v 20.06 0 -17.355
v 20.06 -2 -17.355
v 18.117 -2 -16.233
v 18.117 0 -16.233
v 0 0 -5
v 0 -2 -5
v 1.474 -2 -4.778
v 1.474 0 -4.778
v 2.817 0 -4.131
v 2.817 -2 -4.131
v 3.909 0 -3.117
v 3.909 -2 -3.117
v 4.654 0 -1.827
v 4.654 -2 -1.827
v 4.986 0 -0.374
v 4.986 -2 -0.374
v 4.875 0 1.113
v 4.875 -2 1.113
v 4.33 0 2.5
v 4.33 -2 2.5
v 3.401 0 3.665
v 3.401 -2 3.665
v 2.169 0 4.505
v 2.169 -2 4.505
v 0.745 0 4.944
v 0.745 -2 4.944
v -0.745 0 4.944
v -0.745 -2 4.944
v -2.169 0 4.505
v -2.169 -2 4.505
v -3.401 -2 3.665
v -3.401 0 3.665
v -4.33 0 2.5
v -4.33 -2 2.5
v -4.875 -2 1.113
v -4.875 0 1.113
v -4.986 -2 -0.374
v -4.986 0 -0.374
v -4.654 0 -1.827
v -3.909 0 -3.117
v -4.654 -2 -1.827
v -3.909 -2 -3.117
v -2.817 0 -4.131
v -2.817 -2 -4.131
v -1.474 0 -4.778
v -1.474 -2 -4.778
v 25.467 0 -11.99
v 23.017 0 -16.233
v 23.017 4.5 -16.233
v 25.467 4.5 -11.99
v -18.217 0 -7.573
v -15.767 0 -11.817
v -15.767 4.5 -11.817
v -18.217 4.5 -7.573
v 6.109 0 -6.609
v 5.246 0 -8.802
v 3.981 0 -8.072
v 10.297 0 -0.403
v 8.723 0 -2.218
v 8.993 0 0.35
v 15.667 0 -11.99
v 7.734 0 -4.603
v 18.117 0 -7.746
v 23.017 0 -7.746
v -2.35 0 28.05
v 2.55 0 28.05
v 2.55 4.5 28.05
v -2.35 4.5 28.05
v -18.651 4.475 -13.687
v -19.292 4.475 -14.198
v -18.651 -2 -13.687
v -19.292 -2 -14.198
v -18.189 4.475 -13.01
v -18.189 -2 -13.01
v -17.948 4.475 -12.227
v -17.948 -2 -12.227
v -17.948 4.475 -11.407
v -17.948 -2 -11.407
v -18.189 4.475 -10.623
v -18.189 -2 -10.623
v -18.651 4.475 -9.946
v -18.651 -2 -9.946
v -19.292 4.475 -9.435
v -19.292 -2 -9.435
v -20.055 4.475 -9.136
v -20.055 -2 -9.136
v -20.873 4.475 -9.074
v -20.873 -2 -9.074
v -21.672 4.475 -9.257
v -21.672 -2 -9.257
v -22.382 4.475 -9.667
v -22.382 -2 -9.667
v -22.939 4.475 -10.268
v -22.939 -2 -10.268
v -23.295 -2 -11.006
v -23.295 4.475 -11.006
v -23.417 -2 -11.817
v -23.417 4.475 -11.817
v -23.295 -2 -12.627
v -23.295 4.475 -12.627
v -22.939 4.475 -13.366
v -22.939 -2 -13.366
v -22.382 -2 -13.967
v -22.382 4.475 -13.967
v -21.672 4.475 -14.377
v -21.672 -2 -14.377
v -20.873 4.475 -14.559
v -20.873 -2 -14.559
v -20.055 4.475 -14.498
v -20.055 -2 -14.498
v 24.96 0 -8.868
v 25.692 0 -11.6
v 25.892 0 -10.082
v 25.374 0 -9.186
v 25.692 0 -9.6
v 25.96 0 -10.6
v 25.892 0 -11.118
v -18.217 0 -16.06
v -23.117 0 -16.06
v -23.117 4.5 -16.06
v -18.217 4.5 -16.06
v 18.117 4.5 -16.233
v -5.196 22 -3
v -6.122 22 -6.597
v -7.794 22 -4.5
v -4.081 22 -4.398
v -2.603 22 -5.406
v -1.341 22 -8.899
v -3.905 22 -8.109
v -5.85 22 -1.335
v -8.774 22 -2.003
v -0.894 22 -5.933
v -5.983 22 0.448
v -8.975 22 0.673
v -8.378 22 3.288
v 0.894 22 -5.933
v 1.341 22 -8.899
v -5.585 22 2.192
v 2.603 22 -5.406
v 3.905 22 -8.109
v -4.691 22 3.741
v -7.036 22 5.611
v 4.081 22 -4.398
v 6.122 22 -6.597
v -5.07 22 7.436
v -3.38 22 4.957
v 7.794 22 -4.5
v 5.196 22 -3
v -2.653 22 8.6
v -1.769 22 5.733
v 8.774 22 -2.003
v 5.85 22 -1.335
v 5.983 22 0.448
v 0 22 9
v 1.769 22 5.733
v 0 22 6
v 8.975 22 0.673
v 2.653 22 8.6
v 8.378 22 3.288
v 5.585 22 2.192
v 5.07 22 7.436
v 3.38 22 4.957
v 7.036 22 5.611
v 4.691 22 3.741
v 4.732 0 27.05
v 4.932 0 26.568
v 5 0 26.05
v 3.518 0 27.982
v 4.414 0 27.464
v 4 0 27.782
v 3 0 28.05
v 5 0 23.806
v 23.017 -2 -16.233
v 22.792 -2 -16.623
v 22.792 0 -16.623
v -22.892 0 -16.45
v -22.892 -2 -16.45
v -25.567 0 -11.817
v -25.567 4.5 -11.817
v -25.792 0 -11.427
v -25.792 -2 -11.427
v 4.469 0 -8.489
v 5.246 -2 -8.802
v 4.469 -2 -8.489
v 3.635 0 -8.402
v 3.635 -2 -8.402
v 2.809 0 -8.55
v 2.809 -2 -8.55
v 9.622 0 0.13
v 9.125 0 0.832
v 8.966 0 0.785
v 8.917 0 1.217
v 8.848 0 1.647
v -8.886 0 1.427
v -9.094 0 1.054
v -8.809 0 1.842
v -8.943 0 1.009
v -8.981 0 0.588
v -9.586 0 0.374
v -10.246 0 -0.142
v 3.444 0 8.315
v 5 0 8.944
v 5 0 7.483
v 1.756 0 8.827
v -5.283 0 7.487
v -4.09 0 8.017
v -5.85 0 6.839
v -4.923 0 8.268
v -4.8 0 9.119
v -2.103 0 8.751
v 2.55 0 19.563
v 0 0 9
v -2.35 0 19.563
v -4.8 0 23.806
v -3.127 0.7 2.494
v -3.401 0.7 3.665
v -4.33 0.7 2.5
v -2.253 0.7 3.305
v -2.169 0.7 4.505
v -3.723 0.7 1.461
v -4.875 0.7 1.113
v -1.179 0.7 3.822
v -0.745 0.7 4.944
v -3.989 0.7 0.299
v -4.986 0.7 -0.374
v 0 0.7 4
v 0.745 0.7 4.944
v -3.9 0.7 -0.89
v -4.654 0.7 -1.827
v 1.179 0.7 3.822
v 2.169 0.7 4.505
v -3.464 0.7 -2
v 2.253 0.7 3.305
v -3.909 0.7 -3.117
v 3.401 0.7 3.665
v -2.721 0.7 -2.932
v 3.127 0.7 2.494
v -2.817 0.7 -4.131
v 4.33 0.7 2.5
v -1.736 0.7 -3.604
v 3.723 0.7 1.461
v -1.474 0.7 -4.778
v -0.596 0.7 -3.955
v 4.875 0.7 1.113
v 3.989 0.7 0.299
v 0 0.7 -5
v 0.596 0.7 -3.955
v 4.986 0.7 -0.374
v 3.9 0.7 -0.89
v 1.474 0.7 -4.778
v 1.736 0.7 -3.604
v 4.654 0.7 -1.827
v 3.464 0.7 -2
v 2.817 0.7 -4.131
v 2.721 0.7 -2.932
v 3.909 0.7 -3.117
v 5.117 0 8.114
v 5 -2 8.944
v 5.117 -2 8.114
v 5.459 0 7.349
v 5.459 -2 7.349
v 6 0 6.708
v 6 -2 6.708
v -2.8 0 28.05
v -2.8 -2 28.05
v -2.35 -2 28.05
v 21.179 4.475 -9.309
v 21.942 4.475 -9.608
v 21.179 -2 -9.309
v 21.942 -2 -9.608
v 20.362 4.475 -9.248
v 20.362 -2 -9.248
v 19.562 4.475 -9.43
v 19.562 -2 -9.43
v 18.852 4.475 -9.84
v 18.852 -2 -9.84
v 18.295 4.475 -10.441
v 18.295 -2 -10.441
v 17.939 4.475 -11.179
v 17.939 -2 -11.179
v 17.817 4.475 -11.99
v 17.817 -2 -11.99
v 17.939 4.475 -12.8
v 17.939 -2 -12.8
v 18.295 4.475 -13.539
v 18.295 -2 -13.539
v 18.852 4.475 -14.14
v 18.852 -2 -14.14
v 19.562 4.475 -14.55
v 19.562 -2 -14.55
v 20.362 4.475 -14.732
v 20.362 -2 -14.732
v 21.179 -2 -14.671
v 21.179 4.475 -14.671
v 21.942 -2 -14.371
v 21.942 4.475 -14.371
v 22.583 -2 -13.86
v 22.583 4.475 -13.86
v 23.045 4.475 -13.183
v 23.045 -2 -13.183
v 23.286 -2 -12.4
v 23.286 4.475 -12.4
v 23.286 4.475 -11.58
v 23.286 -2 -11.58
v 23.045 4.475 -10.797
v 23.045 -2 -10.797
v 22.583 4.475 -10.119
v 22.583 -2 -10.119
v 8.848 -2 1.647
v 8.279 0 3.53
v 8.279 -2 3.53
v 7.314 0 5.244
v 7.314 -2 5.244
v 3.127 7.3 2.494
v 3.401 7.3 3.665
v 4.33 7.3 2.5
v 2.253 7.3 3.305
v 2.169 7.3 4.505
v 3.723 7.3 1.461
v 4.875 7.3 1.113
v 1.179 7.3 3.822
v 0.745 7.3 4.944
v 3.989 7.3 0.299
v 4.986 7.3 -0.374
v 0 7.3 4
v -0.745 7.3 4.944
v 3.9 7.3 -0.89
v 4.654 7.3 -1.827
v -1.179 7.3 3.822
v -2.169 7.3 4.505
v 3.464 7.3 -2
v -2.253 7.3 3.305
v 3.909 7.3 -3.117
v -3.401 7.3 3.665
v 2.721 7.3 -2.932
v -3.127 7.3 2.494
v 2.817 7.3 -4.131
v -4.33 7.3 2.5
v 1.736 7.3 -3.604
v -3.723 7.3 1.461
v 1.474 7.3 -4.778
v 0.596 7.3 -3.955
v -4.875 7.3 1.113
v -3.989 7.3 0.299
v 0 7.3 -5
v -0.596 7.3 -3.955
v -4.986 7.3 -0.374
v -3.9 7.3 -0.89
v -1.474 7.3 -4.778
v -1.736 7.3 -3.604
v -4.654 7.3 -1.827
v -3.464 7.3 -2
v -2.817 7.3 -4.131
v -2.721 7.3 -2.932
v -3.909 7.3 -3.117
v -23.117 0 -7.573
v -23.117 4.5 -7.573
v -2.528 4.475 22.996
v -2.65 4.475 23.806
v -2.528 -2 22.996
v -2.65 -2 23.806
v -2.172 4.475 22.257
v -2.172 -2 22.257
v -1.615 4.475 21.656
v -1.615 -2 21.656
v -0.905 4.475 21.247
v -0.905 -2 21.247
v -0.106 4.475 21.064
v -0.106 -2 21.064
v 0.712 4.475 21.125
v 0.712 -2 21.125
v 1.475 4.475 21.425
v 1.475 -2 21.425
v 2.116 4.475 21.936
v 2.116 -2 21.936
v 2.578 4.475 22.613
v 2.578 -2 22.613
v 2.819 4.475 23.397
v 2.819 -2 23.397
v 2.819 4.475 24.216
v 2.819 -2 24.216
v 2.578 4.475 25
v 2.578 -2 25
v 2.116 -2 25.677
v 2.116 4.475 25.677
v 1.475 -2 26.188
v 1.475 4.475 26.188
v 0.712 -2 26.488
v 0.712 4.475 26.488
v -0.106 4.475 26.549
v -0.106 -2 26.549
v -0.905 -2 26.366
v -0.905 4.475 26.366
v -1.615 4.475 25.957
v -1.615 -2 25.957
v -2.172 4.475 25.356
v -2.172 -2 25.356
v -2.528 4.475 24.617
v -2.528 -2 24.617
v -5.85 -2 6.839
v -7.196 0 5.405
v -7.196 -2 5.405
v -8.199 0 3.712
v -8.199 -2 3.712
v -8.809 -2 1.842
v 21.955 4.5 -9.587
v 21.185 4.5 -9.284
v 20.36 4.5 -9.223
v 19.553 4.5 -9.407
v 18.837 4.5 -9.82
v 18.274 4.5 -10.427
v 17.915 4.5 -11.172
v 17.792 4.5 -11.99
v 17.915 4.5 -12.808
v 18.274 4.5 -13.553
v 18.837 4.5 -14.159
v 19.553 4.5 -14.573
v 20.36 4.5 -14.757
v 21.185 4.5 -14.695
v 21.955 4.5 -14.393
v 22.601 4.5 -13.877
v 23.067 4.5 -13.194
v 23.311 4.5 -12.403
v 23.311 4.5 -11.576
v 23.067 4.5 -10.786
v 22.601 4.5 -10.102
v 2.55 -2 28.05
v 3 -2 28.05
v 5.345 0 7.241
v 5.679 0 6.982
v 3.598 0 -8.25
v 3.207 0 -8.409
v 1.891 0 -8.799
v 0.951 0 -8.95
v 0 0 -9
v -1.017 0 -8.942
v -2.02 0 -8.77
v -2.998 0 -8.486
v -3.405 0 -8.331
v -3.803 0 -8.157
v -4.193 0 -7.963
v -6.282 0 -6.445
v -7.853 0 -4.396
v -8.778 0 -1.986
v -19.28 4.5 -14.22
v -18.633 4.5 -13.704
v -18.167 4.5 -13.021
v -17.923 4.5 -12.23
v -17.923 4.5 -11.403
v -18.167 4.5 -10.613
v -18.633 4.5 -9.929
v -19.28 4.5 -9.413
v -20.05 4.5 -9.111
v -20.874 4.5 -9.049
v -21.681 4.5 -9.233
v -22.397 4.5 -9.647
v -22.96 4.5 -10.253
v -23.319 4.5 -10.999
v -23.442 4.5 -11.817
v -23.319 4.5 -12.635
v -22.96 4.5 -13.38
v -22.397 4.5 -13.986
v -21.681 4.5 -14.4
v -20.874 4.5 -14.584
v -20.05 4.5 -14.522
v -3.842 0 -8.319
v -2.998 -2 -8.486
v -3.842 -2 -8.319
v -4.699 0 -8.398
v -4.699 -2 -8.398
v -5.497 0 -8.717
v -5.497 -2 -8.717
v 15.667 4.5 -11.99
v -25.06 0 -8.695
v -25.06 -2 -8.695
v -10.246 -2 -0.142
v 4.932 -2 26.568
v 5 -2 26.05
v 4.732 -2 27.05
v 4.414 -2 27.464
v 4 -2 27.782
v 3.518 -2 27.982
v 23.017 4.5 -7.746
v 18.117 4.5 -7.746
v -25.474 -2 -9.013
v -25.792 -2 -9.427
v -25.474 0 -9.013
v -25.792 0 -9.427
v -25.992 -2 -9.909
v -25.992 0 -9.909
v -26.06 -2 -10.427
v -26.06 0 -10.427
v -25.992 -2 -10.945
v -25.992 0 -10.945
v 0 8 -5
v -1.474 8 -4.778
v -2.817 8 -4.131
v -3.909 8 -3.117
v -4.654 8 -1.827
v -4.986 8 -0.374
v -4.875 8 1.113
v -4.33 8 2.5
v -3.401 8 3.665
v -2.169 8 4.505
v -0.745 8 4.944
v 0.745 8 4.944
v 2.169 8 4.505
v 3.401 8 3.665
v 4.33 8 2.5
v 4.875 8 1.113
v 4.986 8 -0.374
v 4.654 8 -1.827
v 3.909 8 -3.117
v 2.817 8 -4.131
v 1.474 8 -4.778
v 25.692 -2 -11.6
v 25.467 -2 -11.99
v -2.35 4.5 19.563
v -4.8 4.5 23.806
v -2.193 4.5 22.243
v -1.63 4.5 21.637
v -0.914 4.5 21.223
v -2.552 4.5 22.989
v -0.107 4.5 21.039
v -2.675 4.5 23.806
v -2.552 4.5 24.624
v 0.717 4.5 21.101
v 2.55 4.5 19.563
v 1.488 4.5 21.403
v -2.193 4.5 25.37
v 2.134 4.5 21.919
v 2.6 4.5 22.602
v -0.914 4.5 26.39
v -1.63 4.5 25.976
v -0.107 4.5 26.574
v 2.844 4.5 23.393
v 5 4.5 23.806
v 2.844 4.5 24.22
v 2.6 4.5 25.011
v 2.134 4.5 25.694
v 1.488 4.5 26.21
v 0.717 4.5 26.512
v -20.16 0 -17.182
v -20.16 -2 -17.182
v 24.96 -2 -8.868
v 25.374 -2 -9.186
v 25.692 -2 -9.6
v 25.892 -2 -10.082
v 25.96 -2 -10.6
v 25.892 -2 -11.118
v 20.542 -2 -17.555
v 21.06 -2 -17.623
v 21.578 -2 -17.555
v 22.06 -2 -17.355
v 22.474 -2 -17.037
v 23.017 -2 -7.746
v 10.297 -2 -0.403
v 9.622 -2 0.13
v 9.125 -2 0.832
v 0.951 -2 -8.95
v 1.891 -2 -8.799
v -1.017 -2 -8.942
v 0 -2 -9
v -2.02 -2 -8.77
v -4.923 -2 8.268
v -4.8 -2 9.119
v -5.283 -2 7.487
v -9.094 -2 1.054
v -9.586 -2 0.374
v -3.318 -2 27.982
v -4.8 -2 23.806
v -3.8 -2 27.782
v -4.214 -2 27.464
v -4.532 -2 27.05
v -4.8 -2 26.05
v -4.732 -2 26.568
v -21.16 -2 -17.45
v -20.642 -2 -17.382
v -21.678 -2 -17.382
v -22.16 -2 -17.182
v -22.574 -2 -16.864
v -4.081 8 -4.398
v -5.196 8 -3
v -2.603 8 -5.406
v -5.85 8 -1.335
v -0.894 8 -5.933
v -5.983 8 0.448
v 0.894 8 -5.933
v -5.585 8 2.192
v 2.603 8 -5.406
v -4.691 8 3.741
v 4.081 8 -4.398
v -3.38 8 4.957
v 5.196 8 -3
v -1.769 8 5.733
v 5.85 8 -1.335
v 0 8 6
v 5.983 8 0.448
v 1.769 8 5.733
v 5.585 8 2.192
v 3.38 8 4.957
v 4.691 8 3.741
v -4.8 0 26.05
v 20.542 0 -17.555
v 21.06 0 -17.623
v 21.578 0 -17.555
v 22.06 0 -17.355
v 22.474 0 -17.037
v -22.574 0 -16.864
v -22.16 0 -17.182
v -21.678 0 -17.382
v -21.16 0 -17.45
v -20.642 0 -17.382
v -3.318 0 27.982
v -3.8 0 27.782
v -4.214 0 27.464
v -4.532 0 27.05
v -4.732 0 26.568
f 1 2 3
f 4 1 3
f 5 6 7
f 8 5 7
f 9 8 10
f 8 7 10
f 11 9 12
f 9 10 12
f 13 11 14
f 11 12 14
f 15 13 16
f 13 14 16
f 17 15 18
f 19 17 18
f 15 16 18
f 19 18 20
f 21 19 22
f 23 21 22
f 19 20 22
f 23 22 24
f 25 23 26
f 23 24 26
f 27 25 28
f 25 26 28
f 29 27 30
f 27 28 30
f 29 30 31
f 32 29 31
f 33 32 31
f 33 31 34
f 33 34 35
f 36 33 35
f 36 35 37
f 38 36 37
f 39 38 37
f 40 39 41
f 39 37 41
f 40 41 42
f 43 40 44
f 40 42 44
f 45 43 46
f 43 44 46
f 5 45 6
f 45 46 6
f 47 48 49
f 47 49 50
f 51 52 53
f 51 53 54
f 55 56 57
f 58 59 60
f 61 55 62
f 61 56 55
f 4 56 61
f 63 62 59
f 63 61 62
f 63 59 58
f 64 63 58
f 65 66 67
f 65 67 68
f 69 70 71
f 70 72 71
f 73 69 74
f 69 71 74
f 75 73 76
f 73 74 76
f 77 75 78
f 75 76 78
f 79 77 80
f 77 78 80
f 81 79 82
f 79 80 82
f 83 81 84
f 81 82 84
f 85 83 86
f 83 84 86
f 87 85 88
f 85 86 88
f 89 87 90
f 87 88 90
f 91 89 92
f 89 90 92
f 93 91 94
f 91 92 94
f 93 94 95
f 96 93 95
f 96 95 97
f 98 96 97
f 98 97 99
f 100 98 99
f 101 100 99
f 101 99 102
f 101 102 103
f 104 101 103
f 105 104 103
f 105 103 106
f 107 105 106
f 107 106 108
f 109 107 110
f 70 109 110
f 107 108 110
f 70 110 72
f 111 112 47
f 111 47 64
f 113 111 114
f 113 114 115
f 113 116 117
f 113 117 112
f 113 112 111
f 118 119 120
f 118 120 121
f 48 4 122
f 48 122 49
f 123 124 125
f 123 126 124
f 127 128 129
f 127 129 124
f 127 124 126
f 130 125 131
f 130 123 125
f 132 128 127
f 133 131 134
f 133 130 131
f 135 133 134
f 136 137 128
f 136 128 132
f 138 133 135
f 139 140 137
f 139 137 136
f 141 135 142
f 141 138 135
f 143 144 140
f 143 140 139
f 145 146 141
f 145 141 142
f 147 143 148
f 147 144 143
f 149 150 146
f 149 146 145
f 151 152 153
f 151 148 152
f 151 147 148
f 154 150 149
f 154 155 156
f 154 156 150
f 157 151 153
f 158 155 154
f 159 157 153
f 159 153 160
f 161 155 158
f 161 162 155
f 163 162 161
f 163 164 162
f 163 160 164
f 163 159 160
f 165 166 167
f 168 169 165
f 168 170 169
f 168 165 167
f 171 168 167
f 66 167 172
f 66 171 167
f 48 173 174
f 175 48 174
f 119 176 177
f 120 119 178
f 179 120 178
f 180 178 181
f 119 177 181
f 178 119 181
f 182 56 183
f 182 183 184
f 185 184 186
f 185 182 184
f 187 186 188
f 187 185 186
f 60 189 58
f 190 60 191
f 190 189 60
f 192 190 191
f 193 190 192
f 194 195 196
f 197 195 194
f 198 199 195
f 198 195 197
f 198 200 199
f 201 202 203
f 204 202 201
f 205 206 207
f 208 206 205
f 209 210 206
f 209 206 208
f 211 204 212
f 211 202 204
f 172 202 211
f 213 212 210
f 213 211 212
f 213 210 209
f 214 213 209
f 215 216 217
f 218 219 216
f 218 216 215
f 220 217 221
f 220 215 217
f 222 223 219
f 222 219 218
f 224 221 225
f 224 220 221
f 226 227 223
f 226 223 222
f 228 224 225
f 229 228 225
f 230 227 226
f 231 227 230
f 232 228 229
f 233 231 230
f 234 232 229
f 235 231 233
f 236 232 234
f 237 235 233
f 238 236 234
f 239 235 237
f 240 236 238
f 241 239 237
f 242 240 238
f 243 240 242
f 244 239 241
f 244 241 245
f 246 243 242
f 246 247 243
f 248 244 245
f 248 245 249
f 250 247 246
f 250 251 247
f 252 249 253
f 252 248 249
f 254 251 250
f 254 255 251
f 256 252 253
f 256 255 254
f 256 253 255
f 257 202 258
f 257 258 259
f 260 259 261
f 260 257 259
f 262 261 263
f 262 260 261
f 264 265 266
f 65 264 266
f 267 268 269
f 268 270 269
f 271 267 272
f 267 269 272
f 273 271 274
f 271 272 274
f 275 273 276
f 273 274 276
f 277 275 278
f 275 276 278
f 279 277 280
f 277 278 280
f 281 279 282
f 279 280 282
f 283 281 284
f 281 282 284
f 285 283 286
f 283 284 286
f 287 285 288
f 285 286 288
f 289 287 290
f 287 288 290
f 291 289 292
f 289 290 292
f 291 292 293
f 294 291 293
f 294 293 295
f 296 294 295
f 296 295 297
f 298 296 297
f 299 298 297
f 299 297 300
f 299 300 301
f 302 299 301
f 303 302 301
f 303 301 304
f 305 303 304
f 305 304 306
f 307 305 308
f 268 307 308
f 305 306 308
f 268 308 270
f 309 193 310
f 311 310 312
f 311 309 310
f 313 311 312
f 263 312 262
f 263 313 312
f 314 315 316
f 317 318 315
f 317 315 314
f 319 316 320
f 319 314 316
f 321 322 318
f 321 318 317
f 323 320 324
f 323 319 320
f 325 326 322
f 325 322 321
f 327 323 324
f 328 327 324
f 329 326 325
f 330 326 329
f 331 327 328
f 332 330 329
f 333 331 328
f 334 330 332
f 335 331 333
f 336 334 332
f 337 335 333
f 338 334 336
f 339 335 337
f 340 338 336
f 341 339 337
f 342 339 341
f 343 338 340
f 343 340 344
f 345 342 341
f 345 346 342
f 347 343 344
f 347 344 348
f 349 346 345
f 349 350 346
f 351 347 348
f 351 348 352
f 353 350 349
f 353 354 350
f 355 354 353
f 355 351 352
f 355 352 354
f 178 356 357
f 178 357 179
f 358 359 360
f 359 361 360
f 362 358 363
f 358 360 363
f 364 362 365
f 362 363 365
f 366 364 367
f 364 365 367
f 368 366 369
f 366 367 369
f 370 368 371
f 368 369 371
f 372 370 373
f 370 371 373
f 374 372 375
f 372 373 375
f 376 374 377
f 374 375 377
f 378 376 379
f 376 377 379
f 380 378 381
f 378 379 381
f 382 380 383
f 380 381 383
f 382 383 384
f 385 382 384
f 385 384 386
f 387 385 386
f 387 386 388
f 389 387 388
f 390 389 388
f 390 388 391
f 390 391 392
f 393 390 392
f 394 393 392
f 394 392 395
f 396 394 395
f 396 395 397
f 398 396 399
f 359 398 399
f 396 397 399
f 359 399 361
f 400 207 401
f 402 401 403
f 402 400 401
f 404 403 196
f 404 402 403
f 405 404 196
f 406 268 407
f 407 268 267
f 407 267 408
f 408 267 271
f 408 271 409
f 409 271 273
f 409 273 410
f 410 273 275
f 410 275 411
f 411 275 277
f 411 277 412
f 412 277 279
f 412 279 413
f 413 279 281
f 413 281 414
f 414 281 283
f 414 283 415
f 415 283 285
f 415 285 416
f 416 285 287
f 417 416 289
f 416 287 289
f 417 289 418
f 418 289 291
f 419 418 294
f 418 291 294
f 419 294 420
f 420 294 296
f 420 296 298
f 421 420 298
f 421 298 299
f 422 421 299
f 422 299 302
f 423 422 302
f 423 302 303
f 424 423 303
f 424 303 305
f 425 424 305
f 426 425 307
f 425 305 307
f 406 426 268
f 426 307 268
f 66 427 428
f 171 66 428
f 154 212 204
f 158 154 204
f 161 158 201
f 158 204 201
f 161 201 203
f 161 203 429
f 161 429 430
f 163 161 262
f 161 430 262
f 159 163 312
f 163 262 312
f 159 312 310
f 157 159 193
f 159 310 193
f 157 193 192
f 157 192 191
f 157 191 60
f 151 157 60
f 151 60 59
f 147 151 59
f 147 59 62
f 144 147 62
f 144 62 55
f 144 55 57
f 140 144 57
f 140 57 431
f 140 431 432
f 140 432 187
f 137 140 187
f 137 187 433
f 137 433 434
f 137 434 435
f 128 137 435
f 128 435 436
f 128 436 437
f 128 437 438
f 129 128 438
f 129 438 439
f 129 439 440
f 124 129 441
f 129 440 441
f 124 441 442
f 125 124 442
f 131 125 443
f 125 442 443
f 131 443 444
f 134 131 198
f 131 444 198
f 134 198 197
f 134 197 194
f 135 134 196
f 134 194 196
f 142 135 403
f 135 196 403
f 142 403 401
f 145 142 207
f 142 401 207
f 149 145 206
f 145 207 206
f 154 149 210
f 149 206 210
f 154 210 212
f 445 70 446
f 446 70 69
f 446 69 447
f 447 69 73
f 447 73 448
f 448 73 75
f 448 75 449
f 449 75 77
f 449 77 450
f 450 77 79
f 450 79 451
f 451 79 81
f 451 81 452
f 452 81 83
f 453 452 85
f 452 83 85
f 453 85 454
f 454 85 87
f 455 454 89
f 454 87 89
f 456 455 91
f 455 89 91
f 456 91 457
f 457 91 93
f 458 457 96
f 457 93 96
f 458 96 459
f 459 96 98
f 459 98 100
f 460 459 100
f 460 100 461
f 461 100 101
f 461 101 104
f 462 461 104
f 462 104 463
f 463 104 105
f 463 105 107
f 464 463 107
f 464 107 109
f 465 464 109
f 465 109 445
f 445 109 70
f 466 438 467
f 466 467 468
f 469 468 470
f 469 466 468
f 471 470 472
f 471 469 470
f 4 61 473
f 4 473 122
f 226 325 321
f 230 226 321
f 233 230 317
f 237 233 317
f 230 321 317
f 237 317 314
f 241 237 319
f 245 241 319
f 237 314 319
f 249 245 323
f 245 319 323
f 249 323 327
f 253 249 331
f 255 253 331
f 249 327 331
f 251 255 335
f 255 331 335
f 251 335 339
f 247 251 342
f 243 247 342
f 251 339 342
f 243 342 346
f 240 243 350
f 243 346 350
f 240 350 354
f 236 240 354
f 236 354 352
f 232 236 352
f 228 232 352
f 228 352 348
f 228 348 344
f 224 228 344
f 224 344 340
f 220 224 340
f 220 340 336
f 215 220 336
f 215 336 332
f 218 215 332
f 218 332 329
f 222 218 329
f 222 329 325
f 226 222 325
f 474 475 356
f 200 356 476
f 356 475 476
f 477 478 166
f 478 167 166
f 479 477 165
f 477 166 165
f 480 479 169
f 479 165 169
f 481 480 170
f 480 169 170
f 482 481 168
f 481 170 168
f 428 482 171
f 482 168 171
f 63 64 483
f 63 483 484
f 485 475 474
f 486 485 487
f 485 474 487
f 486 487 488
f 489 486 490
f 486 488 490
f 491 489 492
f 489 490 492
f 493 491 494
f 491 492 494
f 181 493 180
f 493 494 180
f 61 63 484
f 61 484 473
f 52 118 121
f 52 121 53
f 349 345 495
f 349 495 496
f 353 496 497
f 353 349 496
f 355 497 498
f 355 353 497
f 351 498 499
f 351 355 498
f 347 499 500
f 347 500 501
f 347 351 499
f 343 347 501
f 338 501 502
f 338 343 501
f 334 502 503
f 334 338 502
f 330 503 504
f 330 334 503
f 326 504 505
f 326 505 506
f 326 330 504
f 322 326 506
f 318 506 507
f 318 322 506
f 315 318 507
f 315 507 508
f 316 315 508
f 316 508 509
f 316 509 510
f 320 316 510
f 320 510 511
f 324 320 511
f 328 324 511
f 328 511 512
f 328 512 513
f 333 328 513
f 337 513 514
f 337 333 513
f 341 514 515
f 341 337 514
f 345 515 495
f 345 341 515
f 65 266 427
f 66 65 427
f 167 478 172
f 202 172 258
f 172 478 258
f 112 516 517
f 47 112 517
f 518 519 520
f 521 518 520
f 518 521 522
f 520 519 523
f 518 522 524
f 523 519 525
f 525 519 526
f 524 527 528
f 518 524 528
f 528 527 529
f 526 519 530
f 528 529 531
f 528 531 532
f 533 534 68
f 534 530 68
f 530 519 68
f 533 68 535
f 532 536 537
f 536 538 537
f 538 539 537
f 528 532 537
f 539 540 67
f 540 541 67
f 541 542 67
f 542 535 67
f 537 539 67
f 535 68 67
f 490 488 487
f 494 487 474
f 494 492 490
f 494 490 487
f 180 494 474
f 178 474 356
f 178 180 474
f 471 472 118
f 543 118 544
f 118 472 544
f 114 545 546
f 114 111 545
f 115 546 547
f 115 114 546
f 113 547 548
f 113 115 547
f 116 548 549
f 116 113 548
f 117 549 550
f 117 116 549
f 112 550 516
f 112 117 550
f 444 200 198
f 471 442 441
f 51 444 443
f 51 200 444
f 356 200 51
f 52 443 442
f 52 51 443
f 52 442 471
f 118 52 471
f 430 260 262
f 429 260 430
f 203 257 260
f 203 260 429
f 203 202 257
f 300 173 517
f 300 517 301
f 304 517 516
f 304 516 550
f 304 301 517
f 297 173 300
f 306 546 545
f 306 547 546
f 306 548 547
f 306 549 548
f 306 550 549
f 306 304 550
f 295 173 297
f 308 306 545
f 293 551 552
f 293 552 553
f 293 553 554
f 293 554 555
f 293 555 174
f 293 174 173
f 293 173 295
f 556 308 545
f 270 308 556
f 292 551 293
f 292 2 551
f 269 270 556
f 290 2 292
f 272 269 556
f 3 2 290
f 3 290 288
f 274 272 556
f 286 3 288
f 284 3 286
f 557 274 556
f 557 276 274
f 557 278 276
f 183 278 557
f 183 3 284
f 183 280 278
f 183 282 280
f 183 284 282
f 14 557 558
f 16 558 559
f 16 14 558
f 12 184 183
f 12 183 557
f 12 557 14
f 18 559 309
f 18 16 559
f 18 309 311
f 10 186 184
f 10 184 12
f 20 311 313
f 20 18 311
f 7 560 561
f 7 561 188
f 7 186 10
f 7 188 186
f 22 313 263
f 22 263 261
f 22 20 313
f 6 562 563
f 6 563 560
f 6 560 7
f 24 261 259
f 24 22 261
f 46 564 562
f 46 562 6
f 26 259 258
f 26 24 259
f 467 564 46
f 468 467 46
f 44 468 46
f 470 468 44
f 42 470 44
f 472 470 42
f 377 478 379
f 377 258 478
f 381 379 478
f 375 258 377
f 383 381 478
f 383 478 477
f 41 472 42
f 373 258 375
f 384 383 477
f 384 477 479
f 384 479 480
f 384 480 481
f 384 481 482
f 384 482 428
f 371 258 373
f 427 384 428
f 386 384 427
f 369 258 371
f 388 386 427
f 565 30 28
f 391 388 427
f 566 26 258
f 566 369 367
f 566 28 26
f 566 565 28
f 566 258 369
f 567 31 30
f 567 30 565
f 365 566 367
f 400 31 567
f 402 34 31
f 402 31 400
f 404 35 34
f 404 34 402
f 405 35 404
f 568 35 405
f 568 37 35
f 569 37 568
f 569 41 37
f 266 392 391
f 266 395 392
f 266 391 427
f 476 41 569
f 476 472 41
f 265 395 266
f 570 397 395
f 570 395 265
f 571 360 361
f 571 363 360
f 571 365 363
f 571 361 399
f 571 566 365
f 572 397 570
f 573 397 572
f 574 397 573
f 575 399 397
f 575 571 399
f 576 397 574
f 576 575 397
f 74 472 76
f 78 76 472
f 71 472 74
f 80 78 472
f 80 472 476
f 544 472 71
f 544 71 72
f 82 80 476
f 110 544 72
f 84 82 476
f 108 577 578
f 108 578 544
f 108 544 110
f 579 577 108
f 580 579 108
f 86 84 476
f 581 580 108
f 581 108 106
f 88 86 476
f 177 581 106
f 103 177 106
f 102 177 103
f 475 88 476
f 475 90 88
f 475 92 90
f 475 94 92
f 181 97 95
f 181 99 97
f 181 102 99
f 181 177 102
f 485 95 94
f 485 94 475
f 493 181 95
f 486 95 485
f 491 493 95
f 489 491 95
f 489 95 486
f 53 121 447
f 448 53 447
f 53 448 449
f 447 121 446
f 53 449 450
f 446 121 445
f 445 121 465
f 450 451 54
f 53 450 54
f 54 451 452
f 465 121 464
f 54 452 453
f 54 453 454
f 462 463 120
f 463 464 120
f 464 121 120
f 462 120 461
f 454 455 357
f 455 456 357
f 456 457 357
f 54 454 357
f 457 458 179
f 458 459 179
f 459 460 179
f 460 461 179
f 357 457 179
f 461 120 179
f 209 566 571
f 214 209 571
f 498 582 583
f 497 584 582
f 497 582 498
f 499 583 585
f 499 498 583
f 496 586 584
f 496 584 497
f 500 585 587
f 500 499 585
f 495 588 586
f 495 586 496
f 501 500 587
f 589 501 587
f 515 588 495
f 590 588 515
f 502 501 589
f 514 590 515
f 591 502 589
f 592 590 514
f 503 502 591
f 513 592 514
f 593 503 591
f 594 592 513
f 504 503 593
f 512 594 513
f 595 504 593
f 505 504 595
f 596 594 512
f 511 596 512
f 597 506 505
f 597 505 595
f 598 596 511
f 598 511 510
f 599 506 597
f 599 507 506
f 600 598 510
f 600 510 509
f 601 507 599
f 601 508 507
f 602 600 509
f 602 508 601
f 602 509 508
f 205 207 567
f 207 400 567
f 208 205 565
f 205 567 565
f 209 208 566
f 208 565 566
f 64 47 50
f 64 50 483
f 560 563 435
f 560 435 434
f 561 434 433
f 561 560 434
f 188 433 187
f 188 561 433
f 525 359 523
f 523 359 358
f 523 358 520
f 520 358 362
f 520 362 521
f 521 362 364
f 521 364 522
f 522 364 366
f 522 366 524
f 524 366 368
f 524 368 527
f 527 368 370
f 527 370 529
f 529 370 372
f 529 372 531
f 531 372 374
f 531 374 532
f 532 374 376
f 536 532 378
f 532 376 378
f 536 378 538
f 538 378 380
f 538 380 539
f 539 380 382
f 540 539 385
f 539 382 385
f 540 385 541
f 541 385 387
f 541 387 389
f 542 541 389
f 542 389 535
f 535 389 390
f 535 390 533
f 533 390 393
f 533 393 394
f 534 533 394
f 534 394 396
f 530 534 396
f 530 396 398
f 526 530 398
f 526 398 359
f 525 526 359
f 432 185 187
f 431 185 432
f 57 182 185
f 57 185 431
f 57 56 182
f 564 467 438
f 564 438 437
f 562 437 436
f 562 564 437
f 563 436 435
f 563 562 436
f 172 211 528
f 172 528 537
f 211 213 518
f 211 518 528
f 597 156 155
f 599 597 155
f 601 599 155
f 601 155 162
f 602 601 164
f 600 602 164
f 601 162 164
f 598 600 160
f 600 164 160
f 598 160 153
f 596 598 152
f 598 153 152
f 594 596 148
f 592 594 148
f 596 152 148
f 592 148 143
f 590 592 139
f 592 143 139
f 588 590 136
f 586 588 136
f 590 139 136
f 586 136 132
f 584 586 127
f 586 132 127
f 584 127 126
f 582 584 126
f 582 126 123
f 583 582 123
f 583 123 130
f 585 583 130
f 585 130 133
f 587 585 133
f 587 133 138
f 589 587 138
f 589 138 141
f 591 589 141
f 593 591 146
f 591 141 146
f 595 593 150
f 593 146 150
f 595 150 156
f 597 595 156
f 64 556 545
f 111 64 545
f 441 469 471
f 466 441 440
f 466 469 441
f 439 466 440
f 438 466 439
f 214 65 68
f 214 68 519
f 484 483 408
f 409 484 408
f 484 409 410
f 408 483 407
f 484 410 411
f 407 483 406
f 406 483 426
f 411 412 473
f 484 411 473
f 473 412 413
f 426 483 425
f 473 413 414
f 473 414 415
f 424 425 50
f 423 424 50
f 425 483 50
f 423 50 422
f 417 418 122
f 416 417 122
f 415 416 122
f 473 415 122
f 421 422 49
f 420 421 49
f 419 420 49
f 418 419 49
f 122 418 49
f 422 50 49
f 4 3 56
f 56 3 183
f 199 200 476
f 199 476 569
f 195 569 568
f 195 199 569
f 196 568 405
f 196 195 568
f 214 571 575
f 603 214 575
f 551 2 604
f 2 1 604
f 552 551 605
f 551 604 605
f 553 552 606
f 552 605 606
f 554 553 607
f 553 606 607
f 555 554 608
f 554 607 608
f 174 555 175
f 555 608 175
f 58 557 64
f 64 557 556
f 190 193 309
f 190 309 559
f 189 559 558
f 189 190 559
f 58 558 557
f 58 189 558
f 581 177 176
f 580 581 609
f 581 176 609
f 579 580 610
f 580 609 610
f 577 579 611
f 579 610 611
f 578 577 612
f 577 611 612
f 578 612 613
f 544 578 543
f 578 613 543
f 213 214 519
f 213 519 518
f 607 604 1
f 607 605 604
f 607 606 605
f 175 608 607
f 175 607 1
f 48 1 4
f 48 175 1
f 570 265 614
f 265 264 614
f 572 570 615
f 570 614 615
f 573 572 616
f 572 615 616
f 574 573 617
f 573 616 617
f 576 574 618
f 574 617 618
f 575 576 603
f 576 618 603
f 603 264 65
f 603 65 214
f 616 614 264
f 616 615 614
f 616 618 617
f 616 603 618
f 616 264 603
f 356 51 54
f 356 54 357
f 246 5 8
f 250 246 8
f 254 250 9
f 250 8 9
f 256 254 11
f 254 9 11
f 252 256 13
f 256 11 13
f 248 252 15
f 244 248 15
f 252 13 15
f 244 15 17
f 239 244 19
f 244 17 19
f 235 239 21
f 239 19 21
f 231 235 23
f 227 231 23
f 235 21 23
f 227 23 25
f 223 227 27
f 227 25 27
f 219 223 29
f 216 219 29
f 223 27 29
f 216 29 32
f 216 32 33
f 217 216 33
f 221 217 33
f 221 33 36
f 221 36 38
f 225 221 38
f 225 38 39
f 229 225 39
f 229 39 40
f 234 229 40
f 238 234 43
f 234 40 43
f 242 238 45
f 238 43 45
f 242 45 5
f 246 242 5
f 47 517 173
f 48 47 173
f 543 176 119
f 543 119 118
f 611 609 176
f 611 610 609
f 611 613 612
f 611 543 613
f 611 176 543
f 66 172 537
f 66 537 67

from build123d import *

# Parameters (mm, degrees)
ESQUISSE2_R                  = 9
BOSS_EXTRU_1_DEPTH           = 22
ESQUISSE5_R                  = 5
BOSS_EXTRU_3_DEPTH           = 2
ESQUISSE6_R                  = 6
ENL_V_MAT_EXTRU_2_DEPTH      = 14
ESQUISSE7_R                  = 4
ENL_V_MAT_EXTRU_3_DEPTH      = 19.920887928
ESQUISSE8_R                  = 5
ENL_V_MAT_EXTRU_4_DEPTH      = 0.7
ENL_V_START                  = -0.7
ESQUISSE9_R                  = 5
ENL_V_MAT_EXTRU_5_DEPTH      = 0.7
BOSS_EXTRU_4_START           = 2
ESQUISSE11_R                 = 9
ESQUISSE11_R_2               = 5
BOSS_EXTRU_4_DEPTH           = 2
BOSS_EXTRU_5_DEPTH           = 2
R_P_TITION_CIRCULAIRE1_COUNT = 3
BOSS_EXTRU_6_DEPTH           = 6.5
R_P_TITION_CIRCULAIRE2_COUNT = 3
D_GAGEMENT_M51_D             = 5.5
D_GAGEMENT_M51_CSINK_D       = 5.55
D_GAGEMENT_M51_CSINK_ANGLE   = 90
R_P_TITION_CIRCULAIRE3_COUNT = 3
CONG_1_R                     = 3
CONG_2_R                     = 3
CONG_3_R                     = 2


with BuildPart() as part:
    # Esquisse2 → Boss.-Extru.1 (new body)
    with BuildSketch(Plane(origin=(0, 0, 0), x_dir=(1, 0, 0), z_dir=(0, 1, 0))):
        Circle(ESQUISSE2_R)
    extrude(amount=BOSS_EXTRU_1_DEPTH)

    # Esquisse5 → Boss.-Extru.3 (add)
    with BuildSketch(Plane(origin=(0, 22, 0), x_dir=(1, 0, 0), z_dir=(0, 1, 0))):
        Circle(ESQUISSE5_R)
    extrude(amount=-BOSS_EXTRU_3_DEPTH)

    # Esquisse6 → Enlèv. mat.-Extru.2 (cut)
    with BuildSketch(Plane(origin=(0, 22, 0), x_dir=(1, 0, 0), z_dir=(0, 1, 0))):
        Circle(ESQUISSE6_R)
    extrude(amount=-ENL_V_MAT_EXTRU_2_DEPTH, mode=Mode.SUBTRACT)

    # Esquisse7 → Enlèv. mat.-Extru.3 (cut, through all)
    with BuildSketch(Plane(origin=(0, 8, 0), x_dir=(1, 0, 0), z_dir=(0, 1, 0))):
        Circle(ESQUISSE7_R)
    extrude(amount=-ENL_V_MAT_EXTRU_3_DEPTH, mode=Mode.SUBTRACT)

    # Esquisse8 → Enlèv. mat.-Extru.4 (cut)
    with BuildSketch(Plane.XZ):
        Circle(ESQUISSE8_R)
    extrude(amount=-ENL_V_MAT_EXTRU_4_DEPTH, mode=Mode.SUBTRACT)

    # Esquisse9 → Enlèv. mat.-Extru.5 (cut)
    with BuildSketch(Plane(origin=(0, 8, 0), x_dir=(1, 0, 0), z_dir=(0, 1, 0)).offset(ENL_V_START)):
        Circle(ESQUISSE9_R)
    extrude(amount=ENL_V_MAT_EXTRU_5_DEPTH, mode=Mode.SUBTRACT)

    # Esquisse11 → Boss.-Extru.4 (add)
    with BuildSketch(Plane.XZ.offset(BOSS_EXTRU_4_START)):
        Circle(ESQUISSE11_R)
        Circle(ESQUISSE11_R_2, mode=Mode.SUBTRACT)
    extrude(amount=-BOSS_EXTRU_4_DEPTH)

    # Esquisse12 → Boss.-Extru.5 (add)
    with BuildSketch(Plane.XZ.offset(2)):
        with BuildLine():
            Line((-4.8, 2.012544091), (-4.8, 28.05))
            Line((-4.8, 28.05), (5, 28.05))
            Line((5, 28.05), (5, 1.445798644))
            ThreePointArc((5, 1.445798644), (0.300499751, 5.196155658), (-4.8, 2.012544091))
        make_face()
    boss_extru_5 = extrude(amount=-BOSS_EXTRU_5_DEPTH)

    # Répétition circulaire1: Boss.-Extru.5 ×3 about axis
    r_p_tition_circulaire1_axis = Axis((0, 0, 0), (0, 1, 0))
    for i in range(1, R_P_TITION_CIRCULAIRE1_COUNT):
        add(boss_extru_5.rotate(r_p_tition_circulaire1_axis, i * 360 / R_P_TITION_CIRCULAIRE1_COUNT))

    # Esquisse13 → Boss.-Extru.6 (add)
    with BuildSketch(Plane.XZ.offset(2)):
        Polygon((-2.35, 28.05), (-4.8, 23.806475521), (-2.35, 19.562951043), (2.55, 19.562951043), (5, 23.806475521), (2.55, 28.05), align=None)
    boss_extru_6 = extrude(amount=-BOSS_EXTRU_6_DEPTH)

    # Répétition circulaire2: Boss.-Extru.6 ×3 about axis
    r_p_tition_circulaire2_axis = Axis((0, 0, 0), (0, 1, 0))
    for i in range(1, R_P_TITION_CIRCULAIRE2_COUNT):
        add(boss_extru_6.rotate(r_p_tition_circulaire2_axis, i * 360 / R_P_TITION_CIRCULAIRE2_COUNT))

    # Dégagement M51 (through all)
    with Locations(Plane(origin=(0, 4.5, 0), x_dir=(1, 0, 0), z_dir=(0, 1, 0))):
        with Locations((0.1, -23.806475521)):
            d_gagement_m51 = CounterSinkHole(D_GAGEMENT_M51_D / 2, D_GAGEMENT_M51_CSINK_D / 2, counter_sink_angle=D_GAGEMENT_M51_CSINK_ANGLE)

    # Répétition circulaire3: Dégagement M51 ×3 about axis
    r_p_tition_circulaire3_axis = Axis((0, 22, 0), (0, -1, 0))
    for i in range(1, R_P_TITION_CIRCULAIRE3_COUNT):
        add(d_gagement_m51.rotate(r_p_tition_circulaire3_axis, i * 360 / R_P_TITION_CIRCULAIRE3_COUNT), mode=Mode.SUBTRACT)

    # Congé1
    cong_1_edges = [part.edges().sort_by_distance(p)[0] for p in [
        (-4.8, -1, 7.613146524),
    ]]
    fillet(cong_1_edges, radius=CONG_1_R)

    # Congé2
    cong_2_edges = [part.edges().sort_by_distance(p)[0] for p in [
        (-4.193178293, -1, -7.9634952),
        (3.980740698, -1, -8.071784406),
        (8.993178293, -1, 0.350348676),
        (5, -1, 7.483314774),
        (-8.980740698, -1, 0.588469632),
    ]]
    fillet(cong_2_edges, radius=CONG_2_R)

    # Congé3
    cong_3_edges = [part.edges().sort_by_distance(p)[0] for p in [
        (-21.892012576, -1, -18.181921938),
        (-26.792012576, -1, -9.694872981),
        (-4.8, -1, 28.05),
        (5, -1, 28.05),
        (26.692012576, -1, -9.868078062),
        (21.792012576, -1, -18.355127019),
    ]]
    fillet(cong_3_edges, radius=CONG_3_R)


solid = part.part
